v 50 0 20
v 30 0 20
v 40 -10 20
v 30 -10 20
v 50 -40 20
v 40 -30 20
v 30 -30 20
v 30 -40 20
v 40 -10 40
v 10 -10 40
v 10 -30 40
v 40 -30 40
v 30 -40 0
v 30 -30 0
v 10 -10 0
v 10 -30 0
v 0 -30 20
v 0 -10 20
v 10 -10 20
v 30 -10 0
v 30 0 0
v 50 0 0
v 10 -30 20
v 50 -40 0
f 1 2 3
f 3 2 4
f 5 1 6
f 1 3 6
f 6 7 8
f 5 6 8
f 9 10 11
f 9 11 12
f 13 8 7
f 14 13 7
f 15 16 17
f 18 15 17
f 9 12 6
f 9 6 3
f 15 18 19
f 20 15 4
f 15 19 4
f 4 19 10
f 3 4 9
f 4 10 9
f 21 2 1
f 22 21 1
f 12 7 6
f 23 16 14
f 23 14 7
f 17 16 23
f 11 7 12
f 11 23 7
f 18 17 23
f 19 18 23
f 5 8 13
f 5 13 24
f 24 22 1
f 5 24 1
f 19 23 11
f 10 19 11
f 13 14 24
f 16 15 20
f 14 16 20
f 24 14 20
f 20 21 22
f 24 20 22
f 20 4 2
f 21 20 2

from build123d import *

# Parameters (mm, degrees)
F0_W     = 50
F0_H     = 40
F1_DEPTH = 40
F2_W     = 10
F2_H     = 20
F3_DEPTH = 50.001
F4_W     = 30
F4_H     = 10
F5_DEPTH = 20.001
F6_W     = 10
F6_H     = 20
F7_DEPTH = 20
F8_W     = 10
F8_H     = 20
F9_DEPTH = 30.001


with BuildPart() as f1:
    # F0 (on Front) → F1 (new body)
    with BuildSketch(Plane.XZ):
        with Locations((25, 20)):
            Rectangle(F0_W, F0_H)
    extrude(amount=F1_DEPTH)

    # F2 (on face) → F3 (cut, through all)
    with BuildSketch(Plane(origin=(0, 0, 0), x_dir=(0, -1, 0), z_dir=(-1, 0, 0))):
        with Locations((5, 30)):
            Rectangle(F2_W, F2_H)
        with Locations((35, 30)):
            Rectangle(F2_W, F2_H)
    extrude(amount=-F3_DEPTH, mode=Mode.SUBTRACT)

    # F4 (on face) → F5 (cut, through all)
    with BuildSketch(Plane.XY.offset(20)):
        with Locations((15, -5)):
            Rectangle(F4_W, F4_H)
        with Locations((15, -35)):
            Rectangle(F4_W, F4_H)
    extrude(amount=-F5_DEPTH, mode=Mode.SUBTRACT)

    # F6 (on face) → F7 (cut, through all)
    with BuildSketch(Plane.XY.offset(40)):
        with Locations((45, -20)):
            Rectangle(F6_W, F6_H)
    extrude(amount=-F7_DEPTH, mode=Mode.SUBTRACT)

    # F8 (on face) → F9 (cut, through all)
    with BuildSketch(Plane.XZ.offset(30)):
        Polygon((10, 0), (0, 20), (0, 0), align=None)
        with Locations((5, 30)):
            Rectangle(F8_W, F8_H)
    extrude(amount=-F9_DEPTH, mode=Mode.SUBTRACT)


solid = f1.part
